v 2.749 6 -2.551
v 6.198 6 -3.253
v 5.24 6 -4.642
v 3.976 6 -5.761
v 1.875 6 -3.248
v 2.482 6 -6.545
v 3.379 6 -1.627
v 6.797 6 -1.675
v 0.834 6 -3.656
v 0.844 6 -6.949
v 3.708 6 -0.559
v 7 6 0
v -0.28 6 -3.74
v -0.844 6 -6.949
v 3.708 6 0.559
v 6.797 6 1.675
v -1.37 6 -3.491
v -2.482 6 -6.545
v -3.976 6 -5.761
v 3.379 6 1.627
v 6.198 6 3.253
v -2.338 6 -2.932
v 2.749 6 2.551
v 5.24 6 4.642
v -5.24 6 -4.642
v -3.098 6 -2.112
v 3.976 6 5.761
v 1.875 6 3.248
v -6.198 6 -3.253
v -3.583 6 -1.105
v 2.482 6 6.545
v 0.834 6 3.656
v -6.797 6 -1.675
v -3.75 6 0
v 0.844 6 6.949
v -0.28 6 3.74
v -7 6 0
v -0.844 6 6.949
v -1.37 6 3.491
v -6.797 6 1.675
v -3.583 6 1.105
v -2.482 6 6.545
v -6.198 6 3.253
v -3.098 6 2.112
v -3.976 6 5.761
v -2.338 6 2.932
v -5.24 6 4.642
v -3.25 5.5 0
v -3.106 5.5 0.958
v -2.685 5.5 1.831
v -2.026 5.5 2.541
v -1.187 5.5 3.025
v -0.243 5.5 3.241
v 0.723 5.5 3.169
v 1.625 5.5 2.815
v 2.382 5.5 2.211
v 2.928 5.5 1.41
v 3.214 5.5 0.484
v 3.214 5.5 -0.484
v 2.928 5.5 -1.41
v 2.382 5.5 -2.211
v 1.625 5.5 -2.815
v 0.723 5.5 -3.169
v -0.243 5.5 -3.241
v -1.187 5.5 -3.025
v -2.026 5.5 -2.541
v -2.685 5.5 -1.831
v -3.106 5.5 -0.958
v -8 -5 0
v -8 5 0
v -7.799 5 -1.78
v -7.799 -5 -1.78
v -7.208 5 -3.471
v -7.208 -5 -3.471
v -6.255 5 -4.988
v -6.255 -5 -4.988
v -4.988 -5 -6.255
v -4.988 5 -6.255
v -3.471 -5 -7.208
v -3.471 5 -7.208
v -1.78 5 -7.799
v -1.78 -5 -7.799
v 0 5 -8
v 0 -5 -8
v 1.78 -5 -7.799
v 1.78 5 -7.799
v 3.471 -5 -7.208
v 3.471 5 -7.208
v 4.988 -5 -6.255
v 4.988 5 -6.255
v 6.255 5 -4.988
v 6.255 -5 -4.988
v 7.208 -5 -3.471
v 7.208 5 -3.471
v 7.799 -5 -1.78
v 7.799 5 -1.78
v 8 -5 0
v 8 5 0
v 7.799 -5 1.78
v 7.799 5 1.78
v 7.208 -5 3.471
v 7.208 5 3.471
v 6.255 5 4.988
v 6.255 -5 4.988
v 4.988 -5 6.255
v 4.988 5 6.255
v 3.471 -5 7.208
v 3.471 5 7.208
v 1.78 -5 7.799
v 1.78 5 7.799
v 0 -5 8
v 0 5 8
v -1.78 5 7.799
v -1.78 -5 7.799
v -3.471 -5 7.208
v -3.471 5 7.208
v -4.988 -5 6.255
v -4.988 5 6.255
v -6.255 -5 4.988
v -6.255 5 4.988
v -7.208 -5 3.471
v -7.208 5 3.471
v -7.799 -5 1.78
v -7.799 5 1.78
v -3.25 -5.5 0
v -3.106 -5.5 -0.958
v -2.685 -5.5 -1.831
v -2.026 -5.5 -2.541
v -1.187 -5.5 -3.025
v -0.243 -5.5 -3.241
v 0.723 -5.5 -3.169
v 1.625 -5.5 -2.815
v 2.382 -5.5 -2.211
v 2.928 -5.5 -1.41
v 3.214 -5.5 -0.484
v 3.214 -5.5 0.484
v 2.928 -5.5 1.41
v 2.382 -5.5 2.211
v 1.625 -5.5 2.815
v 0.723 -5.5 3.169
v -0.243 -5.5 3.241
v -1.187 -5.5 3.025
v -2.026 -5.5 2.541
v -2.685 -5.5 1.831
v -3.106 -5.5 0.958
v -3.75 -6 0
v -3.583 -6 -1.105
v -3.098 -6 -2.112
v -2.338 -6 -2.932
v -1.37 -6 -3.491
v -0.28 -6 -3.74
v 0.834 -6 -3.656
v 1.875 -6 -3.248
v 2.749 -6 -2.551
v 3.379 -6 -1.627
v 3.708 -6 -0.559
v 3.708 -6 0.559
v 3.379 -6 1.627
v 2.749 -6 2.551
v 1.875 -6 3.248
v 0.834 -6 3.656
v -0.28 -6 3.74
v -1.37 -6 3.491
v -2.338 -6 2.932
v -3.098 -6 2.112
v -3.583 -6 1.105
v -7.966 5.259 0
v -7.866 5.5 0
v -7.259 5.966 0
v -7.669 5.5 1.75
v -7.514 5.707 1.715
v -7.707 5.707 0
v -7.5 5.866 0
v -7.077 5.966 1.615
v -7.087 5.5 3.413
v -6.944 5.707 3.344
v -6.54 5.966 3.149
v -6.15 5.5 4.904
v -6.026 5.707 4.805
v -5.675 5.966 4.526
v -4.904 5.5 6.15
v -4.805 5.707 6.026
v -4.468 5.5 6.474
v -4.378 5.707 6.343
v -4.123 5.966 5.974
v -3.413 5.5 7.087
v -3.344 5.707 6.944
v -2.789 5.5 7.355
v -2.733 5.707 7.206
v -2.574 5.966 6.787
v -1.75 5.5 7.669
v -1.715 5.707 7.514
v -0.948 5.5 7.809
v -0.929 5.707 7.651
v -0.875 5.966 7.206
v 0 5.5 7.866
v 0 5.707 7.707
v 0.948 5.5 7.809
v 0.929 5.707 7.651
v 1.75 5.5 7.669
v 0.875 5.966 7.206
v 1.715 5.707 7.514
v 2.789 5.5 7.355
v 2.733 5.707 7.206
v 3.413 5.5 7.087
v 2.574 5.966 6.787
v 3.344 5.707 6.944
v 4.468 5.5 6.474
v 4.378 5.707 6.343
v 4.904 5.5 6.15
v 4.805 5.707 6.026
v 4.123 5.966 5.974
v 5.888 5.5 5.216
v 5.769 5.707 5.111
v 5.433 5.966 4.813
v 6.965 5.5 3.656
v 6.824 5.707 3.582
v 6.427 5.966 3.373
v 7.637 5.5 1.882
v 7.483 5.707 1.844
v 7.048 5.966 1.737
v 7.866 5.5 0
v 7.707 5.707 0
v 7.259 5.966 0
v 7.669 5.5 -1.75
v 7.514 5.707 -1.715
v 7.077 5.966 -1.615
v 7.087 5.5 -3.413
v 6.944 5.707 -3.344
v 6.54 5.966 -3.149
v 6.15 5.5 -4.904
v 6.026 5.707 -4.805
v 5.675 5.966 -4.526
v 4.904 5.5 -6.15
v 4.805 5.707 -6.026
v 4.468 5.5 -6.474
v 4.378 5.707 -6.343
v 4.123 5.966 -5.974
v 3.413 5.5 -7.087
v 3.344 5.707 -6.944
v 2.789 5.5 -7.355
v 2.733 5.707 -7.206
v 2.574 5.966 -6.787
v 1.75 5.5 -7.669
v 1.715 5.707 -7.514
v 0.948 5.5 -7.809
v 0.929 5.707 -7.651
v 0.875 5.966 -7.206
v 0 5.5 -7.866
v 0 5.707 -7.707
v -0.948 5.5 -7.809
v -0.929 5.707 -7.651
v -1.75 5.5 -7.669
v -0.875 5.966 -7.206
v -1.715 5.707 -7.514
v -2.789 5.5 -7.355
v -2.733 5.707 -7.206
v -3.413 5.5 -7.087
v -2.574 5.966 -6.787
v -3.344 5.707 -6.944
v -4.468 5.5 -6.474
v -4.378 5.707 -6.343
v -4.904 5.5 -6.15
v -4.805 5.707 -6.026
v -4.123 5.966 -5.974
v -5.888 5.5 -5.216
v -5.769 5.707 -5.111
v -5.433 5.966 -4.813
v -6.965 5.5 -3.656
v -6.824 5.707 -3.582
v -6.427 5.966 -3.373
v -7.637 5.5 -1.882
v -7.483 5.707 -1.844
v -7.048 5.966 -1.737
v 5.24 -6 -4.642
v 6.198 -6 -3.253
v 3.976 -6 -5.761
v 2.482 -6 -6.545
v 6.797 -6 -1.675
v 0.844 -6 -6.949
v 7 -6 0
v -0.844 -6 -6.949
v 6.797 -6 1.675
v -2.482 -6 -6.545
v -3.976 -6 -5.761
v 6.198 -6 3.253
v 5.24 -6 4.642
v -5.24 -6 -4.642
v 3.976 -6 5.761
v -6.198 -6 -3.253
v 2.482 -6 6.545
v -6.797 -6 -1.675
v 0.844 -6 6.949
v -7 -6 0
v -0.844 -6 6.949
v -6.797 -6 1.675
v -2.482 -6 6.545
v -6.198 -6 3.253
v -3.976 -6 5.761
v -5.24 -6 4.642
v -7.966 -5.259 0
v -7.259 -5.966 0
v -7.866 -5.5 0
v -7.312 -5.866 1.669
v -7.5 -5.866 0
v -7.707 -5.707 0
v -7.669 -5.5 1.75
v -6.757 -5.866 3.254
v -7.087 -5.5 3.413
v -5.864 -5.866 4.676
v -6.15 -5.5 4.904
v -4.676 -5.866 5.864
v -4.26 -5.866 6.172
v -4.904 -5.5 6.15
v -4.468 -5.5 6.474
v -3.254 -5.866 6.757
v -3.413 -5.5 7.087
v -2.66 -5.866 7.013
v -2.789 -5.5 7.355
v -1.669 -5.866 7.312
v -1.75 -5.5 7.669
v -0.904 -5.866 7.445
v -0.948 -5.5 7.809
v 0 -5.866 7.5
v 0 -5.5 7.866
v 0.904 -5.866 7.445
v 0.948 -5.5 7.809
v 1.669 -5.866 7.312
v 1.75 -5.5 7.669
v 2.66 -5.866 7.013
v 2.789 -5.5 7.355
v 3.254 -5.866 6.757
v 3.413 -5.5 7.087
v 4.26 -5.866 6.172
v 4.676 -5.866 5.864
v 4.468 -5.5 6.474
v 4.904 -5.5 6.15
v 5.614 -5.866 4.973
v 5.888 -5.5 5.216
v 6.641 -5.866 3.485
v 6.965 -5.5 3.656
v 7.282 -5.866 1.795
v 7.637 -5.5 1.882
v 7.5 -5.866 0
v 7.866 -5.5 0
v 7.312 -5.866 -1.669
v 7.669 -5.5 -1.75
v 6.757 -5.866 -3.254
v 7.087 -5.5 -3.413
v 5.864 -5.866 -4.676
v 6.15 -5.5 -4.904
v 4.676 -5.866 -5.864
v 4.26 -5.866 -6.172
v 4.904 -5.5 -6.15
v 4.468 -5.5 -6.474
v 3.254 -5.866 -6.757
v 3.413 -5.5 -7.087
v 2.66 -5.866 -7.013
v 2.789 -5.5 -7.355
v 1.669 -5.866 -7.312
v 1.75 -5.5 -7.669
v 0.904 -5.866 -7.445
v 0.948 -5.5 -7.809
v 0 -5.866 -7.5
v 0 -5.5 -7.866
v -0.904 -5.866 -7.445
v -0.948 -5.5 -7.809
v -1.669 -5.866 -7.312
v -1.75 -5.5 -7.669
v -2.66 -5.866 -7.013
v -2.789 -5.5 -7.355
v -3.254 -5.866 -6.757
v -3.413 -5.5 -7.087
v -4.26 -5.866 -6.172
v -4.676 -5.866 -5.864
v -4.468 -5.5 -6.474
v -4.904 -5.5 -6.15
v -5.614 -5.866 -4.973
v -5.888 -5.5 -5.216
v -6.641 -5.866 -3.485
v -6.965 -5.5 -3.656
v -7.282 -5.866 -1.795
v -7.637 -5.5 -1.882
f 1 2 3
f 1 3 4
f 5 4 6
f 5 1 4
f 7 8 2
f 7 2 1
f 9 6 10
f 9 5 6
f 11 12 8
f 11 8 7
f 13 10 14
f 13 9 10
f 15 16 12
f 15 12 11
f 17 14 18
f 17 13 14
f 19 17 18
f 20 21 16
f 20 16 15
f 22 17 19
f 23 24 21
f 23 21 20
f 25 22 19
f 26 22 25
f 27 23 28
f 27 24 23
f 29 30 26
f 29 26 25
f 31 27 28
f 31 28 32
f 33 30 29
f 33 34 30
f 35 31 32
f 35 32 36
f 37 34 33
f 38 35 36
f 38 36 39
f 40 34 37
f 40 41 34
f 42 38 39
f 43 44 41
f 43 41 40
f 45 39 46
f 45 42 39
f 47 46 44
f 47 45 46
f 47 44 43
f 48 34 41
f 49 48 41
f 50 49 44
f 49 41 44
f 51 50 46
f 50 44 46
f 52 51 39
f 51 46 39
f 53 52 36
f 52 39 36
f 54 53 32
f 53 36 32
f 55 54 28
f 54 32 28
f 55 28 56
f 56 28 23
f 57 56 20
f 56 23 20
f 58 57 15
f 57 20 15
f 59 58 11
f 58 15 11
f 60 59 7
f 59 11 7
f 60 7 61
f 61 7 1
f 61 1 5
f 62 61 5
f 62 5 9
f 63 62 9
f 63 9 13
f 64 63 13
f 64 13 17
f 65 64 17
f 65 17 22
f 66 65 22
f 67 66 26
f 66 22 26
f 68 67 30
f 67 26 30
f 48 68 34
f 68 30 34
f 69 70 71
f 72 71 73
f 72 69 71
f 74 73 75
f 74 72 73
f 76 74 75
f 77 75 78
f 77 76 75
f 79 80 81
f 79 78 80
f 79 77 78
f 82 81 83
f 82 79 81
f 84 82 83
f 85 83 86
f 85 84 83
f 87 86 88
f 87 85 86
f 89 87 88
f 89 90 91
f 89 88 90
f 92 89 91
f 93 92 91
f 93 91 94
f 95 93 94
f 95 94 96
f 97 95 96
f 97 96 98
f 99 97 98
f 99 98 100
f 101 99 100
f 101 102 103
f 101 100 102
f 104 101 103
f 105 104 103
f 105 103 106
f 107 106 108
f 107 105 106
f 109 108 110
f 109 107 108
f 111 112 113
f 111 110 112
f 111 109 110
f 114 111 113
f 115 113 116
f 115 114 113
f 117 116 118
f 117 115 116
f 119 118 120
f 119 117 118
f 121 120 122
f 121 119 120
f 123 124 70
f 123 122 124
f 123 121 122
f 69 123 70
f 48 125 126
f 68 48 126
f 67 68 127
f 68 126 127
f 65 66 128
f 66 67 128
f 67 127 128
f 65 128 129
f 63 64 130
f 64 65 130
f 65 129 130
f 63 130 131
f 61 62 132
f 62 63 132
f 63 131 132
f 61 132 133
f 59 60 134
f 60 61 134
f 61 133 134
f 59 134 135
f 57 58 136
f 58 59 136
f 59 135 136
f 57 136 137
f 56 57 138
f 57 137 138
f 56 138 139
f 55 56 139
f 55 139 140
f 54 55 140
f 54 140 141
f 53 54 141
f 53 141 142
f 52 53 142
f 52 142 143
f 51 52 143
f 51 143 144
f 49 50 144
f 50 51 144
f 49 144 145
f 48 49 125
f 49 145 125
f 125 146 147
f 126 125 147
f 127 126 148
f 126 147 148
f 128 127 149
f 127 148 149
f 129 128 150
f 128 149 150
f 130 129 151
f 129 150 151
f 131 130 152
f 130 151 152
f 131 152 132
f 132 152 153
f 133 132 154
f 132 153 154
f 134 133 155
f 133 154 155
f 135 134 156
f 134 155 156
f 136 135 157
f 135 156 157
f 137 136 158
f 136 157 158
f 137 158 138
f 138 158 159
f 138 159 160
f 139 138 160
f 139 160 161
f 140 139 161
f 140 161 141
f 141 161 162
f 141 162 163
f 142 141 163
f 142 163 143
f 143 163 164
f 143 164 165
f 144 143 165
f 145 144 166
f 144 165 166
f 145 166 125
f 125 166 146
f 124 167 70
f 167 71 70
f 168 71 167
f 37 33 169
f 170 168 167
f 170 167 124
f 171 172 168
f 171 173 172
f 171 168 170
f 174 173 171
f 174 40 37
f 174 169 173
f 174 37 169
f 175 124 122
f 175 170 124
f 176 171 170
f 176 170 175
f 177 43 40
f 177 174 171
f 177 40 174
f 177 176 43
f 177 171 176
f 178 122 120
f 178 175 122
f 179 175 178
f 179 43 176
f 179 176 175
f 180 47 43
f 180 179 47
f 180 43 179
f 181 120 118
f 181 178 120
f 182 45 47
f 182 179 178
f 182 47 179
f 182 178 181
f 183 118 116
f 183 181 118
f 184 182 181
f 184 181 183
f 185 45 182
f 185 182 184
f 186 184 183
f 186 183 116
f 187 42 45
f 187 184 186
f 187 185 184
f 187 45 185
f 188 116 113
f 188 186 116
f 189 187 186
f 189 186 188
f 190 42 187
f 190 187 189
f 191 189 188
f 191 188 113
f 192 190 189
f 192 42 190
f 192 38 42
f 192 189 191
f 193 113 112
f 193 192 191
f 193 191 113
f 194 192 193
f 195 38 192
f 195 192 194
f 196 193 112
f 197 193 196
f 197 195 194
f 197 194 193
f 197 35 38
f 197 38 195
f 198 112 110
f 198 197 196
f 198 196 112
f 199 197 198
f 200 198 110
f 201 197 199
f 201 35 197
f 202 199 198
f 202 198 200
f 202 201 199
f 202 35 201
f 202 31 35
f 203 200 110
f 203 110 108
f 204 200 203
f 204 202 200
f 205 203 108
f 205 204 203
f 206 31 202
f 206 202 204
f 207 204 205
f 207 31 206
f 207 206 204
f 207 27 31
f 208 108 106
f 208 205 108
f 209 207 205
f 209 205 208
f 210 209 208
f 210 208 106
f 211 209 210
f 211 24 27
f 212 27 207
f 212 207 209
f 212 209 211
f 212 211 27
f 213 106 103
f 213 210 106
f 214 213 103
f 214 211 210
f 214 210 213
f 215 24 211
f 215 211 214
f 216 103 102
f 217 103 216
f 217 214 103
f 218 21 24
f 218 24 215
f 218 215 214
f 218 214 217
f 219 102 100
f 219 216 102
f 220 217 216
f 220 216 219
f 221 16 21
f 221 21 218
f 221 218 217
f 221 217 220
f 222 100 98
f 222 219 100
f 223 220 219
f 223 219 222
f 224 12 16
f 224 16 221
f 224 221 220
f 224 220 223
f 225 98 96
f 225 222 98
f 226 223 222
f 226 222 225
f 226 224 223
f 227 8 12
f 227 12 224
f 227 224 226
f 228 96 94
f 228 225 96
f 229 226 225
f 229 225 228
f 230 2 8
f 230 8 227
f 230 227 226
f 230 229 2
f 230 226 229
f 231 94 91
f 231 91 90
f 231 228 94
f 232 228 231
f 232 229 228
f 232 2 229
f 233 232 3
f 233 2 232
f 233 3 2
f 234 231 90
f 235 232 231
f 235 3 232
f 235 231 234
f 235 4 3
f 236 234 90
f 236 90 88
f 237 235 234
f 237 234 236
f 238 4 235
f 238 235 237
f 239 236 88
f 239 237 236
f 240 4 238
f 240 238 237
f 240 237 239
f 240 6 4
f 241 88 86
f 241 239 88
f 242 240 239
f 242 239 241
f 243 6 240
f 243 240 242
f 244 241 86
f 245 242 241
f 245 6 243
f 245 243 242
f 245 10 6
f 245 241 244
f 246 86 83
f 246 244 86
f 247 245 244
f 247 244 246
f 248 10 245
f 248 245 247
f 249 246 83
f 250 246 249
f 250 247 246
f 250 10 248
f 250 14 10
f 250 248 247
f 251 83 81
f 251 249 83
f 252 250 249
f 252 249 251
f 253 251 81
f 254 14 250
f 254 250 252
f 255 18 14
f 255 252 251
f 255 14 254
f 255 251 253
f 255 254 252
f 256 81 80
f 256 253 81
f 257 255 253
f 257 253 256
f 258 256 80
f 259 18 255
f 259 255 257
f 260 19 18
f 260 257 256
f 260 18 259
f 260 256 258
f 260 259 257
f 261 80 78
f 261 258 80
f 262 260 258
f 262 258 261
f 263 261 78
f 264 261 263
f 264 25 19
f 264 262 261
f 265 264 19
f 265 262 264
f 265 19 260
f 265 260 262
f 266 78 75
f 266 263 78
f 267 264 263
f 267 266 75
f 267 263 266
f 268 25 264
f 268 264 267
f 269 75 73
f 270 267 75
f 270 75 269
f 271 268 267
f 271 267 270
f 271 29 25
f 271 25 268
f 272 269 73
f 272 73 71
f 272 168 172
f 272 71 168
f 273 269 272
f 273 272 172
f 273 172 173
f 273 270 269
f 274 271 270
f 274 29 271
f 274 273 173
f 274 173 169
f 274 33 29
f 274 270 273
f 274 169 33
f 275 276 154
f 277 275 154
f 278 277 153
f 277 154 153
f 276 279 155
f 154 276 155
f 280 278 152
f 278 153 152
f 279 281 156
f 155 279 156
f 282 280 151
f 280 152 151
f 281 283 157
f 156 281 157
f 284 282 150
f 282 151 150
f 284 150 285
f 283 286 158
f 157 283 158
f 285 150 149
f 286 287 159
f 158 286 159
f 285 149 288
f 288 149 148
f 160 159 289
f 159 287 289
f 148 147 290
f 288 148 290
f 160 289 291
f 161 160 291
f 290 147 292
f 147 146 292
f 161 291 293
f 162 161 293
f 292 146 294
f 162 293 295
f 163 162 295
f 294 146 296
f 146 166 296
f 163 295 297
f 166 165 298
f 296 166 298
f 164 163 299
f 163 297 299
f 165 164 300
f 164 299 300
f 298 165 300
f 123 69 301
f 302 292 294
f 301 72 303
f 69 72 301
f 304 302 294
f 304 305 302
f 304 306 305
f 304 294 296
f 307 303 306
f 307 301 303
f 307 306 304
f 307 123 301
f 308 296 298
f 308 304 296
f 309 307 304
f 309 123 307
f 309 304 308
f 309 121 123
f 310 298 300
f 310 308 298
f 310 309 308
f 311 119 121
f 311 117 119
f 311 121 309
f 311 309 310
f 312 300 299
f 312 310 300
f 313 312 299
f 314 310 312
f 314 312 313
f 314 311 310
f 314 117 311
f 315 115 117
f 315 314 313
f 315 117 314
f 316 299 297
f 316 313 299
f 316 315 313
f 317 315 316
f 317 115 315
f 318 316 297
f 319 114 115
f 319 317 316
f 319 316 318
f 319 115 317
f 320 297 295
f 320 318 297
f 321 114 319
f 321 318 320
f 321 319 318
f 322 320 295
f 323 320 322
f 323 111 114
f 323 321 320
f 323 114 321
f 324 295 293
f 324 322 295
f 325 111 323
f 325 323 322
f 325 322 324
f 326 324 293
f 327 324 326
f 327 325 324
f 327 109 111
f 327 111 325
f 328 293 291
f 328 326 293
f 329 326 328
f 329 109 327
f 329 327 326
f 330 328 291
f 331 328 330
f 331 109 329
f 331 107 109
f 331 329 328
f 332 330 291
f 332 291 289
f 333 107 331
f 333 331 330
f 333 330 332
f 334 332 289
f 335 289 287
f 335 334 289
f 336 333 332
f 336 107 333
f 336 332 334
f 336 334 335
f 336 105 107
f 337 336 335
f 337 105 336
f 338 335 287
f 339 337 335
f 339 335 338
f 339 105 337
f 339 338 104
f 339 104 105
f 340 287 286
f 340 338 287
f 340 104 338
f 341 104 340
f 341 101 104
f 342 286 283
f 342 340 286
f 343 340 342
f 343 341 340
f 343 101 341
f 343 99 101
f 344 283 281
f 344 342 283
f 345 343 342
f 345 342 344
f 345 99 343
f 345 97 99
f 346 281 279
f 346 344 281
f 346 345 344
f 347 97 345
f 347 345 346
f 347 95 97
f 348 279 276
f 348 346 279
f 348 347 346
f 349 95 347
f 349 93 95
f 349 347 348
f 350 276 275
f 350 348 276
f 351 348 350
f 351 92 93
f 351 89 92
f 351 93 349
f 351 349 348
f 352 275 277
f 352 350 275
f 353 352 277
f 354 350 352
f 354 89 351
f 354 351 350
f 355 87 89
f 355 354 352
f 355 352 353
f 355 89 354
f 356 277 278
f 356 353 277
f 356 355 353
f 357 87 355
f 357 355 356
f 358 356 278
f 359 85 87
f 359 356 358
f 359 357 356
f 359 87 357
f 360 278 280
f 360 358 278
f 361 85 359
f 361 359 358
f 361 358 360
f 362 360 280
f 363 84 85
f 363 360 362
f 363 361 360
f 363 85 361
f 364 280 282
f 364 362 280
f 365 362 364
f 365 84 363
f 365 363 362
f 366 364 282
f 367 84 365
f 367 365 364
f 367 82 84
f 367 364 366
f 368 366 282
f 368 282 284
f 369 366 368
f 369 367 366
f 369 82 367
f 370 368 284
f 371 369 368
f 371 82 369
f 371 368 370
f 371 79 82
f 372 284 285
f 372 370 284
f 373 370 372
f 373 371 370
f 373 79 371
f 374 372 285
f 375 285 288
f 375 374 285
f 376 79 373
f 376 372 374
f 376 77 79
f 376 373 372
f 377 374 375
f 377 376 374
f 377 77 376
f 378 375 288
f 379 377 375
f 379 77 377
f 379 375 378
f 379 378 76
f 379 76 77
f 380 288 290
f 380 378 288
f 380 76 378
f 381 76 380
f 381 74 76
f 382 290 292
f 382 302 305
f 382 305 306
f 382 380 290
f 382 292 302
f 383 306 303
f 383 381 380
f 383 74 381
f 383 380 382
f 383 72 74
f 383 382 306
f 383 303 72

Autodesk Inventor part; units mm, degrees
ref_plane "YZ Plane" through (0, 0, 0) normal (1, 0, 0) x (0, 1, 0)
ref_plane "XZ Plane" through (0, 0, 0) normal (0, 1, 0) x (-1, 0, 0)
ref_plane "XY Plane" through (0, 0, 0) normal (0, 0, 1) x (1, 0, 0)
sketch "Sketch1" plane through (0, 0, 0) normal (0, 0, 1) x (1, 0, 0)
  line L0 (0, 6) -> (-8, 6)
  line L1 (-8, 6) -> (-8, -6)
  line L2 (-8, -6) -> (0, -6)
  line L3 (0, -6) -> (0, 6)
  line L4 (-3.25, 6) -> (-3.25, -6)
  point P0 (0, 0)
  point P1 (0, 0)
  dimension "d0" = 12
  dimension "d1" = 6.5
  dimension "d2" = 16
revolve "Revolution1" add sketch "Sketch1" angle 360 about axis through (0, -6, 0) along (0, 1, 0) contours L4 L2 L1 L0
fillet "Fillet1" radius 1 2 edges at (8, 6, 0) (8, -6, 0)
chamfer "Chamfer1" distance 0.5 angle 45 2 edges at (3.25, 6, 0) (3.25, -6, 0)
properties part number "REVO-heater" material "Rubber"
